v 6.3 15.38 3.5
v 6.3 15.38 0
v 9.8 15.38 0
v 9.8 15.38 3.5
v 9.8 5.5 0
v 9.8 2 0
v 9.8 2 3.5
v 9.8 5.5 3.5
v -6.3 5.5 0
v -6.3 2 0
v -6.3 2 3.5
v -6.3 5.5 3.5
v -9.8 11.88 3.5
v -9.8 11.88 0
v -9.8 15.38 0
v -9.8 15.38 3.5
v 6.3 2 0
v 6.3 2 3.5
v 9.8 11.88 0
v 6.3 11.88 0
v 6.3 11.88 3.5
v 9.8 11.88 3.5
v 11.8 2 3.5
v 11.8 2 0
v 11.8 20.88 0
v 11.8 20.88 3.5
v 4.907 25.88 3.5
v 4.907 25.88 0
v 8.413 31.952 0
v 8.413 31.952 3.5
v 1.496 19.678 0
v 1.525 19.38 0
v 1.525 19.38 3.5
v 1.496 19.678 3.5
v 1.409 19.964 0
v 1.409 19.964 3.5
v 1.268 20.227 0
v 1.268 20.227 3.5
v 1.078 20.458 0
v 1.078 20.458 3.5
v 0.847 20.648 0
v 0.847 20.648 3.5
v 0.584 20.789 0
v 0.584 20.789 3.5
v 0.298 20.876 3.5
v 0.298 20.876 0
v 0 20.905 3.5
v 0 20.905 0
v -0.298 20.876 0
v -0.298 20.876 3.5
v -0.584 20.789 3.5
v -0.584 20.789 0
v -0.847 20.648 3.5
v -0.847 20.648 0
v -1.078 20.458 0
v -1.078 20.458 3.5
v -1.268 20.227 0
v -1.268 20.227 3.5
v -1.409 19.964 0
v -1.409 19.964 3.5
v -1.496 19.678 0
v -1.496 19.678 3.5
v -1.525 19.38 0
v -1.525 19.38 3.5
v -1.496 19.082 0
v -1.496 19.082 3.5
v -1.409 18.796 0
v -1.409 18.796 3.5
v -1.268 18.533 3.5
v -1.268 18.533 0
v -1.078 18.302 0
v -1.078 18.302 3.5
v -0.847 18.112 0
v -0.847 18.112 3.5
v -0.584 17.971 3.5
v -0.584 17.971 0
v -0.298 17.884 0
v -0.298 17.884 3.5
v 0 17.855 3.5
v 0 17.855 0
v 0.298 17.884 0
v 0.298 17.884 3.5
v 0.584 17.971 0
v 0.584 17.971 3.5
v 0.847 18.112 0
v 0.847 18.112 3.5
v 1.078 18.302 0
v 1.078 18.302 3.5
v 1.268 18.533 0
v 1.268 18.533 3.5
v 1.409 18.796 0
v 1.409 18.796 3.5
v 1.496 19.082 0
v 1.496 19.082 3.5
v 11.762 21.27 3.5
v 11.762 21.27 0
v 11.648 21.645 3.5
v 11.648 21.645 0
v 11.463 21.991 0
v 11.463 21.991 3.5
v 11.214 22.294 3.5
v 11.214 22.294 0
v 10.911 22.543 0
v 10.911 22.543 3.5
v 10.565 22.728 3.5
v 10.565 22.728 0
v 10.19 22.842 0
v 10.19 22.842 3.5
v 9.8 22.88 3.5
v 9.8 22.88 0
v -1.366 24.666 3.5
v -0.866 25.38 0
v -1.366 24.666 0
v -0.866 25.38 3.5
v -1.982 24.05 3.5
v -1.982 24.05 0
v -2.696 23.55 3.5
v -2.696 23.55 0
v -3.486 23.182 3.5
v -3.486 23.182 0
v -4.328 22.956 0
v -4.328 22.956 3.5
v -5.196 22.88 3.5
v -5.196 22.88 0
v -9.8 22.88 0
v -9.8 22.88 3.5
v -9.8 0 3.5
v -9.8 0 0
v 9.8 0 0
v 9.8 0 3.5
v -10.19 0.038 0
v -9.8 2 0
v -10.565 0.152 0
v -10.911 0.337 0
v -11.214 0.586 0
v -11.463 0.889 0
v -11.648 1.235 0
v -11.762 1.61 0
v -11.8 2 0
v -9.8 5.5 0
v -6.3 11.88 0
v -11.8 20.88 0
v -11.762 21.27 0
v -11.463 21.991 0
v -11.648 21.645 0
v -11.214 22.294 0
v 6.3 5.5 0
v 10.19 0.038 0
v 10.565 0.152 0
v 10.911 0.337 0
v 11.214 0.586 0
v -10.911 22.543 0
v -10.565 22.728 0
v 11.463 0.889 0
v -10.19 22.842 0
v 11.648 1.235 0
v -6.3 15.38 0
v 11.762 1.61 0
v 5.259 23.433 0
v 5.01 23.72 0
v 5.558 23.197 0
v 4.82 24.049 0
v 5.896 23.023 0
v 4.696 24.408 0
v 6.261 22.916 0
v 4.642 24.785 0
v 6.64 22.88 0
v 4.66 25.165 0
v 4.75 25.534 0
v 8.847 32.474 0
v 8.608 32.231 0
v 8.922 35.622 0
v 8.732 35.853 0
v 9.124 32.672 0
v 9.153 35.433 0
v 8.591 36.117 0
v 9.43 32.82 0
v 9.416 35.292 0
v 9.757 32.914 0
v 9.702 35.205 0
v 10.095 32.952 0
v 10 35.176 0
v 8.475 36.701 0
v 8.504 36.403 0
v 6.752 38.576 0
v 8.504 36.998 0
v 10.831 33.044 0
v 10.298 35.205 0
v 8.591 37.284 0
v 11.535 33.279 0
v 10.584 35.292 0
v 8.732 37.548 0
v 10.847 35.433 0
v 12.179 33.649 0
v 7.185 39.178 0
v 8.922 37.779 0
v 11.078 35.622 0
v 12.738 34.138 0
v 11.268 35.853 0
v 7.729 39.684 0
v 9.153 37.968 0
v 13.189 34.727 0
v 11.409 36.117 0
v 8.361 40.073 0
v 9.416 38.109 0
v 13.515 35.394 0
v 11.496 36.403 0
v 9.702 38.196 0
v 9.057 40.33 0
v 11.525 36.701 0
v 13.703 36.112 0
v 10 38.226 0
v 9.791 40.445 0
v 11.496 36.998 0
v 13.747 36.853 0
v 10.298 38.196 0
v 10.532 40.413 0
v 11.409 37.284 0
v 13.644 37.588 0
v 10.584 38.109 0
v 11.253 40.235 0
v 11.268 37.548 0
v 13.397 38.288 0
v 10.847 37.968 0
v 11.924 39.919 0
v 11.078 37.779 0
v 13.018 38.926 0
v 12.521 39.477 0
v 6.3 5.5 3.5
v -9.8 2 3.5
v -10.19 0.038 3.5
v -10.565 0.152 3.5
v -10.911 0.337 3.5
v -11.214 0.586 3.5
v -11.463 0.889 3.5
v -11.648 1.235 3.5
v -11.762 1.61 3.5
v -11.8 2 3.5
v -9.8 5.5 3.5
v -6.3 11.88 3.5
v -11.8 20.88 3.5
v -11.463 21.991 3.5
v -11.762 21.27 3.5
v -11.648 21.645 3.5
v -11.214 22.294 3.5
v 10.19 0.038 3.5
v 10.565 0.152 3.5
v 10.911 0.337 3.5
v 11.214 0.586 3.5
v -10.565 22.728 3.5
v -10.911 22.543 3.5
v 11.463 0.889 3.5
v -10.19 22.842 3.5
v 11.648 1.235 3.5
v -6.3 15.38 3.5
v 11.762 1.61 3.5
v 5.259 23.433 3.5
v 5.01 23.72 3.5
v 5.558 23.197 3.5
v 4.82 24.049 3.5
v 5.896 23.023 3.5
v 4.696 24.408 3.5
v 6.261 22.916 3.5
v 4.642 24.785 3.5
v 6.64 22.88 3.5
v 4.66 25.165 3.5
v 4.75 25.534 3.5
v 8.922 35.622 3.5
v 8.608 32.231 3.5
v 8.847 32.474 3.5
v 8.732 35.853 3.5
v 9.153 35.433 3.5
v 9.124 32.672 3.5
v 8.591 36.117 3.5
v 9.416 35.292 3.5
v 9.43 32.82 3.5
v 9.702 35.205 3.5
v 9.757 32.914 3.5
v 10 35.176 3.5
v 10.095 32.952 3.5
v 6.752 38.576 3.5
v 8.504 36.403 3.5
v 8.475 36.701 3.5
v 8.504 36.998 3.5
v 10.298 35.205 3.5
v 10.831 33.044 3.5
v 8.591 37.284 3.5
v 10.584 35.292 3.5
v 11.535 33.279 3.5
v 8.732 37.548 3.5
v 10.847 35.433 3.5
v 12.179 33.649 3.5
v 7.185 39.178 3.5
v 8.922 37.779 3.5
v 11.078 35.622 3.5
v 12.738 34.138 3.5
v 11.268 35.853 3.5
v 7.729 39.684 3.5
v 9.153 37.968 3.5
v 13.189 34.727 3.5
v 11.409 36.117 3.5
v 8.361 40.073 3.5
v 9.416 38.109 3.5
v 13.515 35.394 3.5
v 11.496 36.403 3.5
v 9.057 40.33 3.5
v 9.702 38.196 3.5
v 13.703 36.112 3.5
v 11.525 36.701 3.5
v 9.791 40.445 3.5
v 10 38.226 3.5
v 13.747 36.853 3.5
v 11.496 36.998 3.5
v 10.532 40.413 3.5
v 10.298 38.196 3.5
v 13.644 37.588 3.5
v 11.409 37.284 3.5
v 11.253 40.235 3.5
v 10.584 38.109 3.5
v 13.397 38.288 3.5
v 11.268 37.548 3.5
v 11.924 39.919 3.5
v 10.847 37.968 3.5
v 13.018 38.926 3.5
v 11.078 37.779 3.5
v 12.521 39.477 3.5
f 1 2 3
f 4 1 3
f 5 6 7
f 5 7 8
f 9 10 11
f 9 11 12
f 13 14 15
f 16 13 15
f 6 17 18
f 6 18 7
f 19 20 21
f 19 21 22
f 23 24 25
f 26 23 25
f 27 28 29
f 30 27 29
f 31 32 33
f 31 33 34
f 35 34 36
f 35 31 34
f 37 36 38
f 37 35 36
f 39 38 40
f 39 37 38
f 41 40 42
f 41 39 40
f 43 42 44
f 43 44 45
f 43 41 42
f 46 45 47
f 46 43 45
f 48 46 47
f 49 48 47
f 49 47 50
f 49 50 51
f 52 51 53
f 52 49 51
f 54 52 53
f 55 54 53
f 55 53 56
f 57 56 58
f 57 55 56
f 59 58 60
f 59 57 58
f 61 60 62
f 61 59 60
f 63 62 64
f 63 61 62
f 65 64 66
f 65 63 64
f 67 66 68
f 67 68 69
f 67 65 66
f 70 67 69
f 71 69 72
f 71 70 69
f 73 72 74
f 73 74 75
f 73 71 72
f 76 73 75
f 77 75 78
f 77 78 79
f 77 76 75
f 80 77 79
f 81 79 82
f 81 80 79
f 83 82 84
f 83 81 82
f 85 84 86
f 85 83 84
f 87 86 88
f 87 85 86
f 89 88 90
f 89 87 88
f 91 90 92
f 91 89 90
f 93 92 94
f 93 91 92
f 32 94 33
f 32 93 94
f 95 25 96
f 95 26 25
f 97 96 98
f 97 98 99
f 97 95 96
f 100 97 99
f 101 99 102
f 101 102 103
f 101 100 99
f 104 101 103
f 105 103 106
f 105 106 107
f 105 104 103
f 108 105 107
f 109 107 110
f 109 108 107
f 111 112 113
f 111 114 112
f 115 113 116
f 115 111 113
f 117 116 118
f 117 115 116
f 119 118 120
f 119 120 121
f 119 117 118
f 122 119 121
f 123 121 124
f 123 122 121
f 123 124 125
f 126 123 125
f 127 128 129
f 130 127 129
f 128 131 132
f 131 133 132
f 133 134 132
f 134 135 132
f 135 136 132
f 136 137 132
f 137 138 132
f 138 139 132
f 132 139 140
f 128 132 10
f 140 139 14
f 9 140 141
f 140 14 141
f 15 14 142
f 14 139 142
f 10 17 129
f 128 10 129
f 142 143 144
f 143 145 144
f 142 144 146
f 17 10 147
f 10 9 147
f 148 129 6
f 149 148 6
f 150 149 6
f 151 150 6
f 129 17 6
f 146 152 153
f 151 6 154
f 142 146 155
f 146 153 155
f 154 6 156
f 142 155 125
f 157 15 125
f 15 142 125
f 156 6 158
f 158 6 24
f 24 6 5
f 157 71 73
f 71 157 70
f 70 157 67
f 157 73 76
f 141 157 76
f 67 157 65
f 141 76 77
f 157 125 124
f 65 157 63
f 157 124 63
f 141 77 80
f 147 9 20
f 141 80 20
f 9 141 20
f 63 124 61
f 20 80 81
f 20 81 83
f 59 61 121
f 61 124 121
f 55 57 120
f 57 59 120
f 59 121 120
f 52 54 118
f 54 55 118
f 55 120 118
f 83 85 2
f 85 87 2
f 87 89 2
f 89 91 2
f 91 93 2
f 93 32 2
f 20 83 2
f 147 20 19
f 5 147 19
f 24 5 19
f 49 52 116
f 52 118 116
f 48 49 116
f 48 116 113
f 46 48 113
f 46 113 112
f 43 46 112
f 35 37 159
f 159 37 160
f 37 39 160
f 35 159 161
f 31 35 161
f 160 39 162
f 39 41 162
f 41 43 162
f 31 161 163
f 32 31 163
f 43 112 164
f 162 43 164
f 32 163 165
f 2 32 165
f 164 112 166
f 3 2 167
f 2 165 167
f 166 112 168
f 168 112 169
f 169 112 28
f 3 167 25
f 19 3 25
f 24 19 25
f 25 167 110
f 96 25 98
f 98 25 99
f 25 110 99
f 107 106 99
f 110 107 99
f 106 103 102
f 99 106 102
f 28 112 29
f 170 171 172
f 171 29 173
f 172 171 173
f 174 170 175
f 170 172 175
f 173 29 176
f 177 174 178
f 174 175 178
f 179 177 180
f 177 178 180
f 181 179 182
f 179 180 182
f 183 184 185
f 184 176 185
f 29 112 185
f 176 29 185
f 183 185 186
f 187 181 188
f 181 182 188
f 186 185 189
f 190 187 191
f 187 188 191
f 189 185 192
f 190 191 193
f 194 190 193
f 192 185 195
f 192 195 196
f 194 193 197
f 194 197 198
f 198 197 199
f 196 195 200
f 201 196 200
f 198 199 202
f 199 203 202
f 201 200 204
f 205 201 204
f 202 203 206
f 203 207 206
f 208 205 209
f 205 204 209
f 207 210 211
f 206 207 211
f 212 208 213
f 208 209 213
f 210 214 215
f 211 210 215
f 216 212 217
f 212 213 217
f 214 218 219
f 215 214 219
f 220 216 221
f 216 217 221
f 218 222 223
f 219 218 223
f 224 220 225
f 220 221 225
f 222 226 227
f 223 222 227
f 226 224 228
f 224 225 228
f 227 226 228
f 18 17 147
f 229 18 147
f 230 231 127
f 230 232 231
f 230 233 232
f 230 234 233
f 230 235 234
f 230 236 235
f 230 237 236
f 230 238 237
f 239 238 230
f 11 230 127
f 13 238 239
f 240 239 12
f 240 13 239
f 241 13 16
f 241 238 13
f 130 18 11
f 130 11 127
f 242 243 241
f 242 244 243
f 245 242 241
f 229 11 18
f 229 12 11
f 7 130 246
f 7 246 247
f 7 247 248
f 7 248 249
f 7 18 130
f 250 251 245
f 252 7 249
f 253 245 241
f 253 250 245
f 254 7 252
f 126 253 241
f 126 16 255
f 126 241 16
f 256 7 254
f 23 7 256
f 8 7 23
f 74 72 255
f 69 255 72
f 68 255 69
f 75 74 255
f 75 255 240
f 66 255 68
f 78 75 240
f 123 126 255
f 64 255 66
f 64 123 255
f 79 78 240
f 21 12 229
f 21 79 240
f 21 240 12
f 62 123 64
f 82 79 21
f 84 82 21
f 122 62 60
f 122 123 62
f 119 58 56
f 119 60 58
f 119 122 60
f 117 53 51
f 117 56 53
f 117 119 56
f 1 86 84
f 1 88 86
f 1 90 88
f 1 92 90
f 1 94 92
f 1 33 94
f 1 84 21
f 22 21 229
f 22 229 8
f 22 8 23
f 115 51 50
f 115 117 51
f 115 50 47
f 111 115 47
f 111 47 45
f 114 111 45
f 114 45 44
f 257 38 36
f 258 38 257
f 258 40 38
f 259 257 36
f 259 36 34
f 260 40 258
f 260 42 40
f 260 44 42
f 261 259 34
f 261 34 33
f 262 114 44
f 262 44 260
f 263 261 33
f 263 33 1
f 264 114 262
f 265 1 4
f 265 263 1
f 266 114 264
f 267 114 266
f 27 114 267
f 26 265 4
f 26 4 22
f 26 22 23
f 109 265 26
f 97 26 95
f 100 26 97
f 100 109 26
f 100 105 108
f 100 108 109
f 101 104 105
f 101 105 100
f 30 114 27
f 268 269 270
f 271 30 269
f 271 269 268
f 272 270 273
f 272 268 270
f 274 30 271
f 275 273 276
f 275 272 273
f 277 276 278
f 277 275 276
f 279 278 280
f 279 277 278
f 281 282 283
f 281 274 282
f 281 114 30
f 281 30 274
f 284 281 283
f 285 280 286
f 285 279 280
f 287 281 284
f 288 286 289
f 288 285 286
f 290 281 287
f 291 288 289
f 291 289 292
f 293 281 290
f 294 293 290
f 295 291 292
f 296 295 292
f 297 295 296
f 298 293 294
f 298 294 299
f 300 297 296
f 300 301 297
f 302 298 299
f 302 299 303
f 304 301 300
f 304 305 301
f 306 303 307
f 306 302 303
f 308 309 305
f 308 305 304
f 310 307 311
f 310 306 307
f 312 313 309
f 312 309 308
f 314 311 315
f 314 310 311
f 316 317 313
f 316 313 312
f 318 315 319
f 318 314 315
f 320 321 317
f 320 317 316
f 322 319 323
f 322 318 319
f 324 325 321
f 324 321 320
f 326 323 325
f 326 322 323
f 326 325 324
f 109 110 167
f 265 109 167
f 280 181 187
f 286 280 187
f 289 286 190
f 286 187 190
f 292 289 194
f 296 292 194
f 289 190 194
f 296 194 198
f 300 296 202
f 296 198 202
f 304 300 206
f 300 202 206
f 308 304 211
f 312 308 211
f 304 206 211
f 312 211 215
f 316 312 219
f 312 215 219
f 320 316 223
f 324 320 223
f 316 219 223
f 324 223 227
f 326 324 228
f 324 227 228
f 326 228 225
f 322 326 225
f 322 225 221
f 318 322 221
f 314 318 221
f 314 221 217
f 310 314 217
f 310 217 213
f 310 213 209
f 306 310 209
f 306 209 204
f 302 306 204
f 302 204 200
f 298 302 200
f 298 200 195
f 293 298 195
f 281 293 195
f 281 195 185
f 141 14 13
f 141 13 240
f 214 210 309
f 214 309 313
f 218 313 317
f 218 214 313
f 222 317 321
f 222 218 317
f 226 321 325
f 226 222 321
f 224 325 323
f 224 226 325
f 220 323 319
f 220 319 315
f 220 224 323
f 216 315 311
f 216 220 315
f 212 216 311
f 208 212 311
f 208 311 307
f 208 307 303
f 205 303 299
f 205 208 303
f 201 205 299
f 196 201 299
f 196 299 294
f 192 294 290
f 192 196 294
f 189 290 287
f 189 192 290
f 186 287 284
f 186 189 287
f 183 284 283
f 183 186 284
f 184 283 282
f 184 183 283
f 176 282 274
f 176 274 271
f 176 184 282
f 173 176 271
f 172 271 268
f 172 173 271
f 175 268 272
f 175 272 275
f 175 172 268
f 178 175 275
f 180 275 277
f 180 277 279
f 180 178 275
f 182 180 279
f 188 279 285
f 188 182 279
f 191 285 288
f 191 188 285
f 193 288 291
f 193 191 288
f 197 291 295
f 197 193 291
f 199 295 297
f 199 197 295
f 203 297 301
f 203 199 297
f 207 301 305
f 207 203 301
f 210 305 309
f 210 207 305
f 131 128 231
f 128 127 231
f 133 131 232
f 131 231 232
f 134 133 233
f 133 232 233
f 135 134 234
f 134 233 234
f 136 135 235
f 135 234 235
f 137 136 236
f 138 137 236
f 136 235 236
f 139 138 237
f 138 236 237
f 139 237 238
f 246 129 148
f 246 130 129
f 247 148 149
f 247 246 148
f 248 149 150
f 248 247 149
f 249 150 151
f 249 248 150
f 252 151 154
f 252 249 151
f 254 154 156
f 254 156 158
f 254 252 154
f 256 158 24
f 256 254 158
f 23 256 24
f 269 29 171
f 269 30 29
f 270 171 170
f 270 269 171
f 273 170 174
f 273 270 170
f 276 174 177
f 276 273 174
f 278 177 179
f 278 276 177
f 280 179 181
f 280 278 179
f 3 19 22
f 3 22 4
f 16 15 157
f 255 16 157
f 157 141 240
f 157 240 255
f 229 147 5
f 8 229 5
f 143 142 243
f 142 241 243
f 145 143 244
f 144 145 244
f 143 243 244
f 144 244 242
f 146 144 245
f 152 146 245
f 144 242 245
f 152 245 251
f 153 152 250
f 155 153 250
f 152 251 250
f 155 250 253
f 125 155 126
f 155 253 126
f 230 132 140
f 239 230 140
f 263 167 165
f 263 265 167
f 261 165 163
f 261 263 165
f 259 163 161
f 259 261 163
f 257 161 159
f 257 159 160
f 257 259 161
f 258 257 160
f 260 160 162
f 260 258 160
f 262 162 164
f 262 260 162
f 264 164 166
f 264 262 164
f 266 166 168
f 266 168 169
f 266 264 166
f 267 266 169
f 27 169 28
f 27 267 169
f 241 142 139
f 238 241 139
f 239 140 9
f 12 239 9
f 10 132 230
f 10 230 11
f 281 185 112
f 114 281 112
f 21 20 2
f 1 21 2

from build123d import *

# Parameters (mm, degrees)
SKETCH1_R           = 1.525
SKETCH1_W           = 3.5
SKETCH1_H           = 3.5
BOSS_EXTRUDE1_DEPTH = 3.5
FILLET1_R           = 2
FILLET2_R           = 2
FILLET3_R           = 5


with BuildPart() as part:
    # Sketch1 → Boss-Extrude1 (new body)
    with BuildSketch(Plane.XY):
        with BuildLine():
            Line((-11.8, 0), (11.8, 0))
            Line((11.8, 0), (11.8, 22.88))
            Line((11.8, 22.88), (3.175426481, 22.88))
            Line((3.175426481, 22.88), (9.058921367, 33.070512069))
            ThreePointArc((9.058921367, 33.070512069), (13.458683639, 38.149648334), (6.752404736, 38.575508076))
            Line((6.752404736, 38.575508076), (-2.309401077, 22.88))
            Line((-2.309401077, 22.88), (-11.8, 22.88))
            Line((-11.8, 22.88), (-11.8, 0))
        make_face()
        with Locations((0, 19.38)):
            Circle(SKETCH1_R, mode=Mode.SUBTRACT)
        with Locations((10, 36.700508076)):
            Circle(SKETCH1_R, mode=Mode.SUBTRACT)
        with Locations((-8.05, 3.75)):
            Rectangle(SKETCH1_W, SKETCH1_H, mode=Mode.SUBTRACT)
        with Locations((8.05, 3.75)):
            Rectangle(SKETCH1_W, SKETCH1_H, mode=Mode.SUBTRACT)
        with Locations((8.05, 13.63)):
            Rectangle(SKETCH1_W, SKETCH1_H, mode=Mode.SUBTRACT)
        with Locations((-8.05, 13.63)):
            Rectangle(SKETCH1_W, SKETCH1_H, mode=Mode.SUBTRACT)
    extrude(amount=BOSS_EXTRUDE1_DEPTH)

    # Fillet1
    fillet1_edges = [part.edges().sort_by_distance(p)[0] for p in [
        (-11.8, 22.88, 1.75),
        (11.8, 22.88, 1.75),
        (11.8, 0, 1.75),
        (-11.8, 0, 1.75),
    ]]
    fillet(fillet1_edges, radius=FILLET1_R)

    # Fillet2
    fillet2_edges = [part.edges().sort_by_distance(p)[0] for p in [
        (9.058921367, 33.070512069, 1.75),
        (3.175426481, 22.88, 1.75),
    ]]
    fillet(fillet2_edges, radius=FILLET2_R)

    # Fillet3
    fillet3_edges = [part.edges().sort_by_distance(p)[0] for p in [
        (-2.309401077, 22.88, 1.75),
    ]]
    fillet(fillet3_edges, radius=FILLET3_R)


solid = part.part
